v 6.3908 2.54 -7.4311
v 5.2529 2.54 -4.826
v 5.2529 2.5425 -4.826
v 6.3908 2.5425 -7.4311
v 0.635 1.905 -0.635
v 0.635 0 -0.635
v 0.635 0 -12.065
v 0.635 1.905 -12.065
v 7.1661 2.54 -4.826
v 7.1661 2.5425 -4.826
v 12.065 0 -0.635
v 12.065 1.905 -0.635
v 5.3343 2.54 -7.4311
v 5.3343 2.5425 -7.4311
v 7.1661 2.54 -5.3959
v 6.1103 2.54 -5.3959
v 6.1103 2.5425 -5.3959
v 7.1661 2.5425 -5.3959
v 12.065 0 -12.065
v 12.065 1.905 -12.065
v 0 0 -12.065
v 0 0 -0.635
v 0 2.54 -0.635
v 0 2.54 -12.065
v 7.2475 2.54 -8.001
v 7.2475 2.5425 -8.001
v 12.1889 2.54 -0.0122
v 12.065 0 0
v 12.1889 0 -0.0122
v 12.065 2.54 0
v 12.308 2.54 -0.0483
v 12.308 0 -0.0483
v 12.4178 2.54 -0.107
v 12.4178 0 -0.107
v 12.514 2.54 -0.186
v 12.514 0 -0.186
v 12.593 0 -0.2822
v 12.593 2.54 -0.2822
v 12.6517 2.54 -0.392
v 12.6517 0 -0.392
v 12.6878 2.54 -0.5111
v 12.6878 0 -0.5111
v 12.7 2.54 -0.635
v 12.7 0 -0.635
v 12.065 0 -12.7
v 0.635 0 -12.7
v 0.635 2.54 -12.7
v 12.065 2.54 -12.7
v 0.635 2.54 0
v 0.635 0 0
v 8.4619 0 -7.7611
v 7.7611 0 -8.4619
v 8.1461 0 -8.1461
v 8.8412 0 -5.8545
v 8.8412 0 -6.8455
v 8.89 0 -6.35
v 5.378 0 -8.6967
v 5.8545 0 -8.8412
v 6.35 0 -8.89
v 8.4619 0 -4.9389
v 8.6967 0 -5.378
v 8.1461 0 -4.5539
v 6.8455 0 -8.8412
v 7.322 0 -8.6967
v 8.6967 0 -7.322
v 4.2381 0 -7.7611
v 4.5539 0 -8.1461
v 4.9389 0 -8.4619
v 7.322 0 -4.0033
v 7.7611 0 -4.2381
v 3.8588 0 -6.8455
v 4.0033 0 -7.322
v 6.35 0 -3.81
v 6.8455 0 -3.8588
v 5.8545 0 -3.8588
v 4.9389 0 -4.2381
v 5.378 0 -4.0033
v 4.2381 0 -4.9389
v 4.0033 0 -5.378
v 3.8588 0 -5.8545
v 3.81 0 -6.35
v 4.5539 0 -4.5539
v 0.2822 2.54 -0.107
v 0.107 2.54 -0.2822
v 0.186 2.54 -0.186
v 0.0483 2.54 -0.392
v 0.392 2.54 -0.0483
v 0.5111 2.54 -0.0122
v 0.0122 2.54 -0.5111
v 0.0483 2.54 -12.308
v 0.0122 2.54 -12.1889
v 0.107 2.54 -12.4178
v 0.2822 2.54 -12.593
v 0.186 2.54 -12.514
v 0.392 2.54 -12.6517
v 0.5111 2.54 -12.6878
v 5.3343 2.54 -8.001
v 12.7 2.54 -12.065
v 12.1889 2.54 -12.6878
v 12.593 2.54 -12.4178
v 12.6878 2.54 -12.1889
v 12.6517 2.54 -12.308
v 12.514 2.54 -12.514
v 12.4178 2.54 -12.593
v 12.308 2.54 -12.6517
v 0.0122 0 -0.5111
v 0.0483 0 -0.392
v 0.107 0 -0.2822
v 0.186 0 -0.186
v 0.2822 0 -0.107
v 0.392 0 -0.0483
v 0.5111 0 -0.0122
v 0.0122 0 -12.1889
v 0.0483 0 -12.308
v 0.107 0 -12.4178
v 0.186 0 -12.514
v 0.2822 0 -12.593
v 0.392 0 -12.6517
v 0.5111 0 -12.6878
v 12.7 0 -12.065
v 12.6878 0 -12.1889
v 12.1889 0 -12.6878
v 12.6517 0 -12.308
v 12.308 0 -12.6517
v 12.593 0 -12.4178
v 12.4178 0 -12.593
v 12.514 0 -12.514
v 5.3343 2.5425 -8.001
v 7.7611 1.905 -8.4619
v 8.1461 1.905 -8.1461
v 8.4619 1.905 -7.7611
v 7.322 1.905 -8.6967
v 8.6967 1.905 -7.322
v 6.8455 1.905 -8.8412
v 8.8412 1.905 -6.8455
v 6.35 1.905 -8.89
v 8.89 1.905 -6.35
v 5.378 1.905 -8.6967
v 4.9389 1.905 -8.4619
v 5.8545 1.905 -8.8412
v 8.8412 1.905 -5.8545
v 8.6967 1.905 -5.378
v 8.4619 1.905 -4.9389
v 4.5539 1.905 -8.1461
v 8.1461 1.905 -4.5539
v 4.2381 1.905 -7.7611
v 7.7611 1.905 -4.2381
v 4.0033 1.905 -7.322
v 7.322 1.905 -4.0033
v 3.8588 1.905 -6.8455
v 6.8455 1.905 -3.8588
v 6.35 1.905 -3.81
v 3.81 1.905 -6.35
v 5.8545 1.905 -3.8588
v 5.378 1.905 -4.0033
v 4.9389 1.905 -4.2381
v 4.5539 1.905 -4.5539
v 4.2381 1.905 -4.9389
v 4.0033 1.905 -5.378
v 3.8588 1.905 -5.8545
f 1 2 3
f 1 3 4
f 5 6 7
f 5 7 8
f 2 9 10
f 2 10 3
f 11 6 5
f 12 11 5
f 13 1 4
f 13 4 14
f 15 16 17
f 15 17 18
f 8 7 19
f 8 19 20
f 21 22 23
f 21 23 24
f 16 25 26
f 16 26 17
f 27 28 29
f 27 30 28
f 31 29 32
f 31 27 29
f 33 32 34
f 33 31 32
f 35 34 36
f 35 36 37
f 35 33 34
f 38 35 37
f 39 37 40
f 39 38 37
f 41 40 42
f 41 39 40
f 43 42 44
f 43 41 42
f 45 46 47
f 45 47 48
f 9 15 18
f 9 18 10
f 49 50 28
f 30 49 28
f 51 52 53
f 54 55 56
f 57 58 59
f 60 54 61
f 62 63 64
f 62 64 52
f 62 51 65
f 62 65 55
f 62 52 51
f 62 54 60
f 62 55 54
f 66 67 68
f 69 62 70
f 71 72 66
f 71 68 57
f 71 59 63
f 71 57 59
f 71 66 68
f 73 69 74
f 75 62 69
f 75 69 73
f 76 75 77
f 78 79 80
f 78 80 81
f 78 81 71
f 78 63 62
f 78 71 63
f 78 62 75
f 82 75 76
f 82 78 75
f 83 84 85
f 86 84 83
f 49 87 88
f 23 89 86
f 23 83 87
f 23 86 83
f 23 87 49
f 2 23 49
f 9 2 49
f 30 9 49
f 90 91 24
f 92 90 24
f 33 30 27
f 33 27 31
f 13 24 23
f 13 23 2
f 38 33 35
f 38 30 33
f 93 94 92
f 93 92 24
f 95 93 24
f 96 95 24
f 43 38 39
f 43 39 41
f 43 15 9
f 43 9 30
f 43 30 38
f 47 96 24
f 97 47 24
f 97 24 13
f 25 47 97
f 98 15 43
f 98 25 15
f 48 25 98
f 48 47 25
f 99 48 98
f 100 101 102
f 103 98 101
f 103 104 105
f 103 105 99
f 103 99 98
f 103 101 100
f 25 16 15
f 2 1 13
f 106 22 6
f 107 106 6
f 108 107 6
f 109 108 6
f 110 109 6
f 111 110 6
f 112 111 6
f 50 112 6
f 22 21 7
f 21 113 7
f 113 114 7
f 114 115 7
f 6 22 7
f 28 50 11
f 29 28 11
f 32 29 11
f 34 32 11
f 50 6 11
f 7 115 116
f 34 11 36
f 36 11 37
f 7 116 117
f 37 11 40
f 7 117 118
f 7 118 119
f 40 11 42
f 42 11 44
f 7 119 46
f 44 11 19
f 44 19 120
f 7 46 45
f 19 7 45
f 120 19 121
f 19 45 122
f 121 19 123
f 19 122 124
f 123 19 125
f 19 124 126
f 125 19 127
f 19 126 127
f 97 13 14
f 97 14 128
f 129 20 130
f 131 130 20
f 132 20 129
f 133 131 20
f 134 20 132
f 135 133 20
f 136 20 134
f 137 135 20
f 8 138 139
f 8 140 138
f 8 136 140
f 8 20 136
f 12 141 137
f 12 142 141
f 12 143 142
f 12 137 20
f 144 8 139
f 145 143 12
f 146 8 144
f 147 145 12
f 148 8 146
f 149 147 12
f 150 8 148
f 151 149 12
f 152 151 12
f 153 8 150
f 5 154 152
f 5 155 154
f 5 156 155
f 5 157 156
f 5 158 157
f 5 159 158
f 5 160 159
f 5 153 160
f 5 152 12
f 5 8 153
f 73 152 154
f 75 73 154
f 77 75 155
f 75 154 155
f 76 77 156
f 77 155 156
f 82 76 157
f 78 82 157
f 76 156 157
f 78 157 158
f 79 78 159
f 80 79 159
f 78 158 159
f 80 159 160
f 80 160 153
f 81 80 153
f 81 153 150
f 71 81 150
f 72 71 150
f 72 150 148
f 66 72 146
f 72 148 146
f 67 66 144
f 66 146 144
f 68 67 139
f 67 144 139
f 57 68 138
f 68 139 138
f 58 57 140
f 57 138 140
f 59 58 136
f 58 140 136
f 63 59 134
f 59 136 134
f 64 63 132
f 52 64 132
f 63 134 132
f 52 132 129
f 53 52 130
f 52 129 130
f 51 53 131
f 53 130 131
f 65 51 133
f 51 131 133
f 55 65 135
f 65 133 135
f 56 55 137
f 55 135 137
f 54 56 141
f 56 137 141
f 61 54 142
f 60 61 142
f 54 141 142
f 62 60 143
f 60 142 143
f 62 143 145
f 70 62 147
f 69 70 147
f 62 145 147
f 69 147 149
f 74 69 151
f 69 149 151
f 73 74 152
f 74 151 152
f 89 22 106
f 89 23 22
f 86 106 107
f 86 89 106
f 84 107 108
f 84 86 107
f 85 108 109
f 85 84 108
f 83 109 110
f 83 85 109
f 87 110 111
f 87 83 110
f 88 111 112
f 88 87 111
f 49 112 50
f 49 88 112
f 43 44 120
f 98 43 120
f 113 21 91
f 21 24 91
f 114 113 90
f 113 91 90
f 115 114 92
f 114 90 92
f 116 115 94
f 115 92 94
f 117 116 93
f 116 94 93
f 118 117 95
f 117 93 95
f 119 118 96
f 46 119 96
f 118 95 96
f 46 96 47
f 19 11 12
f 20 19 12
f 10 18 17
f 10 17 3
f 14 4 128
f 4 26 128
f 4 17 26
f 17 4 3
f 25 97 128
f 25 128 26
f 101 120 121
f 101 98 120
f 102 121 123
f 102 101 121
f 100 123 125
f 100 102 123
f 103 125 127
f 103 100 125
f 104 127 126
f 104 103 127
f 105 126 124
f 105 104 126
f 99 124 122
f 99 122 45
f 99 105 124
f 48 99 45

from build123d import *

# Parameters (mm, degrees)
SKETCH1_W           = 12.7
SKETCH1_H           = 12.7
BOSS_EXTRUDE1_DEPTH = 2.54
FILLET1_R           = 0.635
SHELL1_START        = 0.635
SHELL1_OUTLINE_W    = 1.905
SHELL1_OUTLINE_H    = 11.43
SHELL1_DEPTH        = 11.43
SKETCH2_R           = 2.54
BOSS_EXTRUDE2_DEPTH = 1.905
BOSS_EXTRUDE3_DEPTH = 0.00254


# Read off the part's stored shape, not the designer's step: Shell1
with BuildPart() as part:
    # Sketch1 → Boss-Extrude1 (new body)
    with BuildSketch(Plane(origin=(0, 0, 0), x_dir=(1, 0, 0), z_dir=(0, 1, 0))):
        with Locations((6.35, 6.35)):
            Rectangle(SKETCH1_W, SKETCH1_H)
    extrude(amount=BOSS_EXTRUDE1_DEPTH)

    # Fillet1
    fillet1_edges = [part.edges().sort_by_distance(p)[0] for p in [
        (0, 1.27, -12.7),
        (12.7, 1.27, -12.7),
        (12.7, 1.27, 0),
        (0, 1.27, 0),
    ]]
    fillet(fillet1_edges, radius=FILLET1_R)

    # Shell1 outline → Shell1 (cut)
    with BuildSketch(Plane.YZ.offset(SHELL1_START)):
        with Locations((0.9525, -6.35)):
            Rectangle(SHELL1_OUTLINE_W, SHELL1_OUTLINE_H)
    extrude(amount=SHELL1_DEPTH, mode=Mode.SUBTRACT)

    # Sketch2 → Boss-Extrude2 (add)
    with BuildSketch(Plane(origin=(0, 1.905, 0), x_dir=(-1, 0, 0), z_dir=(0, -1, 0))):
        with Locations(Location((-6.35, 6.35, 0), (0, 0, 270))):
            Circle(SKETCH2_R)
    extrude(amount=BOSS_EXTRUDE2_DEPTH)

    # Sketch3 → Boss-Extrude3 (add)
    with BuildSketch(Plane(origin=(0, 2.54, 0), x_dir=(1, 0, 0), z_dir=(0, 1, 0))):
        Polygon((5.334325641, 8.001), (7.247466667, 8.001), (6.110267147, 5.395871795), (7.16605641, 5.395871795), (7.16605641, 4.826), (5.252915385, 4.826), (6.390750921, 7.431128205), (5.334325641, 7.431128205), align=None)
    extrude(amount=BOSS_EXTRUDE3_DEPTH)


solid = part.part
